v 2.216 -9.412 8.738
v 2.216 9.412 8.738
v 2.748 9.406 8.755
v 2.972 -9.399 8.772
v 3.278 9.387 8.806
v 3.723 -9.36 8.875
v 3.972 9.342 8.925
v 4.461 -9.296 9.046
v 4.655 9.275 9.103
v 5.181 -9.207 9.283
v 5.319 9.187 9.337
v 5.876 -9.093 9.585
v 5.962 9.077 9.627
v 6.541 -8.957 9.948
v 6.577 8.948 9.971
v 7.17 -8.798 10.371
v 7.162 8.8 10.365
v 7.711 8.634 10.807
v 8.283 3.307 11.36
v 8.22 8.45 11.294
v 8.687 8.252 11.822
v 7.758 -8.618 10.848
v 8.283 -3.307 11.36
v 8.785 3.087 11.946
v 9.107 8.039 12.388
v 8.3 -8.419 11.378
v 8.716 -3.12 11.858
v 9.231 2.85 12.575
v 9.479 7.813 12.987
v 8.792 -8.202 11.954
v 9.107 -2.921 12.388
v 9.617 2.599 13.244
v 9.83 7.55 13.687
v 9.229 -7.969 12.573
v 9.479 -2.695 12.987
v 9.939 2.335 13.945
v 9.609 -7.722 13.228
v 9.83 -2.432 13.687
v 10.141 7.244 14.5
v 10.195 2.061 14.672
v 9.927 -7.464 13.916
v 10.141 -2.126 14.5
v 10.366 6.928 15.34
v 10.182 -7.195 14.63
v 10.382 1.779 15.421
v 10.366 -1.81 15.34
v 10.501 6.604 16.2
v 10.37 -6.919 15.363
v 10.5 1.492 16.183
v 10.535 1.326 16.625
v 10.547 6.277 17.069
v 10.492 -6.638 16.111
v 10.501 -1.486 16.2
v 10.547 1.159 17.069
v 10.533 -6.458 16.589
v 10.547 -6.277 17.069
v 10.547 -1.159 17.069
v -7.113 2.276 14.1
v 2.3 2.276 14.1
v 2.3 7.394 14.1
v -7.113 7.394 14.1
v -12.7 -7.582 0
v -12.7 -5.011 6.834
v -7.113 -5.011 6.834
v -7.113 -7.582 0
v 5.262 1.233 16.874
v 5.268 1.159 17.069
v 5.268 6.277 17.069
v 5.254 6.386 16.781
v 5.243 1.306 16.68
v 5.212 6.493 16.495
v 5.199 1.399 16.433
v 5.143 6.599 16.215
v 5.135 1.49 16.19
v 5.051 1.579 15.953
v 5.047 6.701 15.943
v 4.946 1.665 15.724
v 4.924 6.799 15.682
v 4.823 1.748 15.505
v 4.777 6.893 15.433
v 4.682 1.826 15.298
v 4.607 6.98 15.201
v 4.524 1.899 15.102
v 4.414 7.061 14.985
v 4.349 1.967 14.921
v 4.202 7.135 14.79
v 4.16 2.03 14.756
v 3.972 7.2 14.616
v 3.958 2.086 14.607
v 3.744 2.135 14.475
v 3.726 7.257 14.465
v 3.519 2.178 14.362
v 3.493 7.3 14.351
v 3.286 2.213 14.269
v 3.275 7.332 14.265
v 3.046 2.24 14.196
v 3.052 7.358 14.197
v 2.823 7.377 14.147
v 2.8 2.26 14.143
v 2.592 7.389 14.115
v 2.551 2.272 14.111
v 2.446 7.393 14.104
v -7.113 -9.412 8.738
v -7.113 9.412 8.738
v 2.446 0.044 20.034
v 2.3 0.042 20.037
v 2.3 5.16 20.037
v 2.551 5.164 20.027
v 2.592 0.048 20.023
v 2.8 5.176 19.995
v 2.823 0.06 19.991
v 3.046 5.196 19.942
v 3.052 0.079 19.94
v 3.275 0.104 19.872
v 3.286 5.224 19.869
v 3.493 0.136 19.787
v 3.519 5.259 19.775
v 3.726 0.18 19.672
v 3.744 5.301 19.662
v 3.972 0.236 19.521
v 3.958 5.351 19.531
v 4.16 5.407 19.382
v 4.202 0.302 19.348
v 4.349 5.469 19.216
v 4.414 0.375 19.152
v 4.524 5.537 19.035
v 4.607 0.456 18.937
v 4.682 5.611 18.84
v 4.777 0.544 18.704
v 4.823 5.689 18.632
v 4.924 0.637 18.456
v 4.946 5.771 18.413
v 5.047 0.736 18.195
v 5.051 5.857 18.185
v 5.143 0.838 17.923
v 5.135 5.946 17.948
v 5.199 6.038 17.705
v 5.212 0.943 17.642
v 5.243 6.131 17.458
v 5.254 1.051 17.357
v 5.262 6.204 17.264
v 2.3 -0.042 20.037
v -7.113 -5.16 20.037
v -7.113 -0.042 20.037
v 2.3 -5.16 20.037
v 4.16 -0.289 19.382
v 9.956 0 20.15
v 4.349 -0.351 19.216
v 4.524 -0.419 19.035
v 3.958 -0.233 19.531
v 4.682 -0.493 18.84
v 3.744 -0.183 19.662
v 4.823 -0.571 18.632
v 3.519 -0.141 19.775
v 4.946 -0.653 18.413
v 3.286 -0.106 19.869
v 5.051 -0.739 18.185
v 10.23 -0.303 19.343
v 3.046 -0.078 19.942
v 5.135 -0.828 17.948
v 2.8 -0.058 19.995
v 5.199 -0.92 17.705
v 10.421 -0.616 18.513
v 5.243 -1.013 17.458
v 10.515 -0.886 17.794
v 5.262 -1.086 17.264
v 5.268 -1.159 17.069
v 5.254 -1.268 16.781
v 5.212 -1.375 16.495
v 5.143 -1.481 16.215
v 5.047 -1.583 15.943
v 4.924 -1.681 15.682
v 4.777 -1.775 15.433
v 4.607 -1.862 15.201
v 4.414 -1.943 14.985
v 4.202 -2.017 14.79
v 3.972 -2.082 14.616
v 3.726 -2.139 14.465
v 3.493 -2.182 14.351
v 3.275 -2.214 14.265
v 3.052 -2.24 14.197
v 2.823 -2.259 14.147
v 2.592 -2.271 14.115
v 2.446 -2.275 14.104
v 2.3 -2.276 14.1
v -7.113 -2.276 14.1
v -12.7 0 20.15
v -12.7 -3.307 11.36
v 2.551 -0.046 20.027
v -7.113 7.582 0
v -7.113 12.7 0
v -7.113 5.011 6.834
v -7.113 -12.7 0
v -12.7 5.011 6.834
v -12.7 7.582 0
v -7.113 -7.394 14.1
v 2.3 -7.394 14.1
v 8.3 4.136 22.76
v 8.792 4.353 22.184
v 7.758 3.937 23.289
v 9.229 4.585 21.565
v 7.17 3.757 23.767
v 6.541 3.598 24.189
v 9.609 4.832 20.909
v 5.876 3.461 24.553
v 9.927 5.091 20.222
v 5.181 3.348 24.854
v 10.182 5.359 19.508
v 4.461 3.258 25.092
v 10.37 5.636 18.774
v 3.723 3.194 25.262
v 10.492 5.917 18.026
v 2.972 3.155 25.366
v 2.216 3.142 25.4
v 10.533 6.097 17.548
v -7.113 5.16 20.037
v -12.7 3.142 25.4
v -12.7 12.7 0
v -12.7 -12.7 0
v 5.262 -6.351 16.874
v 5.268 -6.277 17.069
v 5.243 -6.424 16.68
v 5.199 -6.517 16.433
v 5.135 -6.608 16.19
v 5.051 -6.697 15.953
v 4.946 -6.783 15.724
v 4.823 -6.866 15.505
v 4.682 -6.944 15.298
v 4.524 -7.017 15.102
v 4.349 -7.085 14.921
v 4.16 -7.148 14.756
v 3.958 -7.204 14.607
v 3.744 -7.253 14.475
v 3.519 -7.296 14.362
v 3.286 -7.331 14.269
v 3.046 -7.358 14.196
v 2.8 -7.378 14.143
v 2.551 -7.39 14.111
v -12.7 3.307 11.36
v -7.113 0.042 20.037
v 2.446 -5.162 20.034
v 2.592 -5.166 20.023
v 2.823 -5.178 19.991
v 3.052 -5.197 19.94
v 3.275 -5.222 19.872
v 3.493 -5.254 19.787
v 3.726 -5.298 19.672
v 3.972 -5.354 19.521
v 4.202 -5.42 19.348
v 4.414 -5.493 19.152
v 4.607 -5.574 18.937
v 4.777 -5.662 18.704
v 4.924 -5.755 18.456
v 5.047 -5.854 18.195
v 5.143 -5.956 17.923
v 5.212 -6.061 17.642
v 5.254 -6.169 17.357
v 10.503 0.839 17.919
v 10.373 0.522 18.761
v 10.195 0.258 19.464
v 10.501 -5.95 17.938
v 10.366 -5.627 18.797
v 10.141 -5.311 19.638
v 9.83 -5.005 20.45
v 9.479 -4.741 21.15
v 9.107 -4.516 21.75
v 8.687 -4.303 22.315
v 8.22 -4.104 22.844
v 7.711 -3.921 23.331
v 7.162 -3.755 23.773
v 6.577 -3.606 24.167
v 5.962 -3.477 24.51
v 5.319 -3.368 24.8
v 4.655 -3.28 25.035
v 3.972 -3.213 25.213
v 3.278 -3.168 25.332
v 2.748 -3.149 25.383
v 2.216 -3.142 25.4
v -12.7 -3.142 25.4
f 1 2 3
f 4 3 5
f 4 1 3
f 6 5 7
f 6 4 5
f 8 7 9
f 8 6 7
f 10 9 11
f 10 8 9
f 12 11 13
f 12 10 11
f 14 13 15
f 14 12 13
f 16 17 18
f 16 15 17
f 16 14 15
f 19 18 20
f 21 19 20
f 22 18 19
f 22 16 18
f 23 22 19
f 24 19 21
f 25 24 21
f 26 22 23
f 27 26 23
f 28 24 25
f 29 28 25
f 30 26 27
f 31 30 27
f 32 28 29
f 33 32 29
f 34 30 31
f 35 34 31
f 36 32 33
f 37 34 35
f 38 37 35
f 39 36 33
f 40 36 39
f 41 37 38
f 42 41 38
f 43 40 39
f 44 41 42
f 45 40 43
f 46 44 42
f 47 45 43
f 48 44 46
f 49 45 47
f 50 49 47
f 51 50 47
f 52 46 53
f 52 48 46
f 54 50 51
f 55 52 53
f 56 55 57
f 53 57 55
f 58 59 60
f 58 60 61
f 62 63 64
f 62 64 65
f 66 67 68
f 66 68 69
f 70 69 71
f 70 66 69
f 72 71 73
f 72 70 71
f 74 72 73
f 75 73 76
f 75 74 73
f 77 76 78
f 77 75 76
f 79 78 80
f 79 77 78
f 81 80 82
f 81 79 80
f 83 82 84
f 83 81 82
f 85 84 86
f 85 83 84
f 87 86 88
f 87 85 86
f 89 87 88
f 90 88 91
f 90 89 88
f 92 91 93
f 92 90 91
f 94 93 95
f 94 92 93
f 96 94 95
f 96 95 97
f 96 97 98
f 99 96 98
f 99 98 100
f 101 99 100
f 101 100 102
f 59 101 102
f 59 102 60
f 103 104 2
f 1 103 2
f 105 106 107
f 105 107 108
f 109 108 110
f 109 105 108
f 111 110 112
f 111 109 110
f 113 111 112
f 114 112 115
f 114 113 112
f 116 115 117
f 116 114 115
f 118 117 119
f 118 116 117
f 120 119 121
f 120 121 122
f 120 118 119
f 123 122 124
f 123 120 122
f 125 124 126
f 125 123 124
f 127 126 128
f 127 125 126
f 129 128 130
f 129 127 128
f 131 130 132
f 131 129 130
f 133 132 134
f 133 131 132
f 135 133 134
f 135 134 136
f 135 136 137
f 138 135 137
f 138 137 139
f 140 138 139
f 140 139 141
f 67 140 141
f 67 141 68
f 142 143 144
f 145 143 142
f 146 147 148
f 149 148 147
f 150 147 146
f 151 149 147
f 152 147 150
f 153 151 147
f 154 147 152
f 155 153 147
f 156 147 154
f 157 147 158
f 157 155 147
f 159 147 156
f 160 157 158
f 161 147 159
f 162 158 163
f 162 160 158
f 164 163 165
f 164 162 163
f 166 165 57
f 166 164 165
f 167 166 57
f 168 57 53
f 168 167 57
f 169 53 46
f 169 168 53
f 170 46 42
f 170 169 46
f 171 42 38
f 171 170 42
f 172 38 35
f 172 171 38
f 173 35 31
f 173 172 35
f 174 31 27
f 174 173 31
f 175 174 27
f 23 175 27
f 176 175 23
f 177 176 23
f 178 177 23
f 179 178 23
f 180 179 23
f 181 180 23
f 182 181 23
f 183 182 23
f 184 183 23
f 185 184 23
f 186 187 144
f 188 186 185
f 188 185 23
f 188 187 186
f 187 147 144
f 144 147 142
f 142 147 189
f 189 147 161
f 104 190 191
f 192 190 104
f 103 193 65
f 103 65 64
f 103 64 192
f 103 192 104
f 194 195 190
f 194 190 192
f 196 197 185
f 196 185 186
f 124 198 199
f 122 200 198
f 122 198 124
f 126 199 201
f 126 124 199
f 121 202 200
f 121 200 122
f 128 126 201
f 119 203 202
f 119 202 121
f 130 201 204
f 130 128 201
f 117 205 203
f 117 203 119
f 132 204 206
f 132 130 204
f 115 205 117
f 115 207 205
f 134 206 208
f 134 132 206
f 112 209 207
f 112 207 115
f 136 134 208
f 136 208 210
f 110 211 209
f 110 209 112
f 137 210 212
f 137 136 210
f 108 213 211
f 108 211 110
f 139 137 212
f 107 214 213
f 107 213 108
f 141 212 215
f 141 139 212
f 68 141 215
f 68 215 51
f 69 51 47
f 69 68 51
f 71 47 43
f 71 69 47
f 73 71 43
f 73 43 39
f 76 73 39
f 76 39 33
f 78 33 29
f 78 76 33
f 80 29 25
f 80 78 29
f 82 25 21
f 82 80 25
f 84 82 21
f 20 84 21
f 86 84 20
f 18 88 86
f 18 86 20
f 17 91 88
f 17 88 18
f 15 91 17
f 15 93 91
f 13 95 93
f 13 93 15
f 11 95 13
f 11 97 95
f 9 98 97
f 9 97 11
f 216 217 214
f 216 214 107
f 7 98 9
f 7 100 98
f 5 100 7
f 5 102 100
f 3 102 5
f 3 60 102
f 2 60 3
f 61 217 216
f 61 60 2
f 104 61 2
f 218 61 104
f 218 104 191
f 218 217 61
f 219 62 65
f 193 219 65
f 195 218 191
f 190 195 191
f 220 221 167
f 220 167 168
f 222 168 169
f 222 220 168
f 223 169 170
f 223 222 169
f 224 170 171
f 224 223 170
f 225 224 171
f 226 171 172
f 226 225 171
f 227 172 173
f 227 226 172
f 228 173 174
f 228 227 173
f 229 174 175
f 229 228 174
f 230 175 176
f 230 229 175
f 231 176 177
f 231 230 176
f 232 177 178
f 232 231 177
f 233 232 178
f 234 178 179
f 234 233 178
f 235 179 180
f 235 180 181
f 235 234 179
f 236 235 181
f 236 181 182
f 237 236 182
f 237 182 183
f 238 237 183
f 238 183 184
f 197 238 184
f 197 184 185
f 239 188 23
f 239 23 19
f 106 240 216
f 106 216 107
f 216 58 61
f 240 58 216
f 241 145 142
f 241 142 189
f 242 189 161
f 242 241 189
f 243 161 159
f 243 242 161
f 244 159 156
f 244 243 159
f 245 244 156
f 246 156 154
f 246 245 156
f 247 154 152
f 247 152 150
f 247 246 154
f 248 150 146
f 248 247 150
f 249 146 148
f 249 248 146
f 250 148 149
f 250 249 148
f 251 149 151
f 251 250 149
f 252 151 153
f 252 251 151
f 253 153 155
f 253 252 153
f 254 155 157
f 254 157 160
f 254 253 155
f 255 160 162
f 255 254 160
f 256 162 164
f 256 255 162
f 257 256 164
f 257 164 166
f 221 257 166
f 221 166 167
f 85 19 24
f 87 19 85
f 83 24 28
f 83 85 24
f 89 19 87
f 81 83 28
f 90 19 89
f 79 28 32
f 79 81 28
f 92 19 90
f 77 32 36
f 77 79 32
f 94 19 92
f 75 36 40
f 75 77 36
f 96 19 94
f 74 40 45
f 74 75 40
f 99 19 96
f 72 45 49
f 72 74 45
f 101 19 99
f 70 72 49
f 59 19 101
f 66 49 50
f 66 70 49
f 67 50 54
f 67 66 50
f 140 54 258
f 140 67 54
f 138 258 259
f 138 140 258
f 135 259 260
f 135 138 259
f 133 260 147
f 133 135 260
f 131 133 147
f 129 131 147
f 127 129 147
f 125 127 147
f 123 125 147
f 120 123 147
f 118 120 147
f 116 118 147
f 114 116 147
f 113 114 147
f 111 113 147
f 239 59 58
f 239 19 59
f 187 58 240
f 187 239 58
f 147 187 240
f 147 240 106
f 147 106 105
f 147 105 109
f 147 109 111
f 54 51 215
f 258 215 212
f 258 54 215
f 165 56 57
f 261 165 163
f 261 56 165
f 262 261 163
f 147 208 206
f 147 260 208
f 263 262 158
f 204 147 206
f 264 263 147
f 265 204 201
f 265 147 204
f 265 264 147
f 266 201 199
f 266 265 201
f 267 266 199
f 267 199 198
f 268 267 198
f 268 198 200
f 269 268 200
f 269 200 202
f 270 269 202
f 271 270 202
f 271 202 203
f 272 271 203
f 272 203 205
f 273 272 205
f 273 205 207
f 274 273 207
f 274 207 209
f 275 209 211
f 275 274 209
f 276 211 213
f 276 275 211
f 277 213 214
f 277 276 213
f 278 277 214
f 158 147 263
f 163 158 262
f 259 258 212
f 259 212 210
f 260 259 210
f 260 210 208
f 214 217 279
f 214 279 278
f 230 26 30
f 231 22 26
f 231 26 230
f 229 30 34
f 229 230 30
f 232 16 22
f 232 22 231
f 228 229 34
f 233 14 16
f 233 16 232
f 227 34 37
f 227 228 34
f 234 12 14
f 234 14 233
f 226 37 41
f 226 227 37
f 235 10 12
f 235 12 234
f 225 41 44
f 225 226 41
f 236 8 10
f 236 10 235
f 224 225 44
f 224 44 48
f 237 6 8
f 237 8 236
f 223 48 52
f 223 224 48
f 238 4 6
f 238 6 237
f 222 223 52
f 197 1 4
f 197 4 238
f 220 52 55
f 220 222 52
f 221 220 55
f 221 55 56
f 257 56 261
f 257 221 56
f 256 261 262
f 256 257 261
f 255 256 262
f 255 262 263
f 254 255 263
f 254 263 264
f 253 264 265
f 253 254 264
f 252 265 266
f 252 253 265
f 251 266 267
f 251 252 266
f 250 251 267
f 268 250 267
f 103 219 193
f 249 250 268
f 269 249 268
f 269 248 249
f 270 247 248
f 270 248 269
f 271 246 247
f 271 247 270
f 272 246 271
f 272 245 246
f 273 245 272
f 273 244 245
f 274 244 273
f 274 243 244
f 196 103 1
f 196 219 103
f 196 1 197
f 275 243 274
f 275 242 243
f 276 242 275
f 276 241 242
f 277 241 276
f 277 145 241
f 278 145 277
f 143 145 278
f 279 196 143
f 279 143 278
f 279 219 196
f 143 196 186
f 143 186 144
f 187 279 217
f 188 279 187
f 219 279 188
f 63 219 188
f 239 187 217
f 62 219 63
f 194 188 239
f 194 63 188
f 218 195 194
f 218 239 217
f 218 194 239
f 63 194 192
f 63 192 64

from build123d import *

# Parameters (mm, degrees)
F0_W     = 25.4
F0_H     = 25.4
F1_DEPTH = 25.4
F5_DEPTH = 25.401
F6_DEPTH = 25.401


with BuildPart() as f1:
    # F0 (on Top) → F1 (new body)
    with BuildSketch(Plane.XY):
        Rectangle(F0_W, F0_H)
    extrude(amount=F1_DEPTH)

    # F3 (on face) → F5 (intersect, through all)
    with BuildSketch(Plane(origin=(-12.7, 0, 0), x_dir=(0, -1, 0), z_dir=(-1, 0, 0))):
        Polygon((3.142383, 25.4), (0, 25.4), (-3.142383, 25.4), (-12.7, 0), (-7.581967, 0), (-5.010512, 6.833812), (0, 6.833812), (5.010512, 6.833812), (7.581967, 0), (12.7, 0), align=None)
        Polygon((-3.307431, 11.359861), (0, 20.149579), (3.307431, 11.359861), (0, 11.359861), align=None, mode=Mode.SUBTRACT)
    extrude(amount=-F5_DEPTH, mode=Mode.INTERSECT)

    # F4 (on face) → F6 (intersect, through all)
    with BuildSketch(Plane.XZ.offset(12.7)):
        with BuildLine():
            Line((-7.112893, 25.4), (-12.7, 25.4))
            Line((-12.7, 25.4), (-12.7, 0))
            Line((-12.7, 0), (-7.112893, 0))
            Line((-7.112893, 0), (-7.112893, 8.737554))
            Line((-7.112893, 8.737554), (2.215559, 8.737554))
            ThreePointArc((2.215559, 8.737554), (-2.51092, 10.208043), (-5.56892, 14.100417))
            Line((-5.56892, 14.100417), (-7.112893, 14.100417))
            Line((-7.112893, 14.100417), (-7.112893, 20.037137))
            Line((-7.112893, 20.037137), (-5.56892, 20.037137))
            ThreePointArc((-5.56892, 20.037137), (-2.51092, 23.929511), (2.215559, 25.4))
            Line((2.215559, 25.4), (-7.112893, 25.4))
        make_face()
        with BuildLine():
            ThreePointArc((10.546782, 17.068777), (8.106623, 22.959841), (2.215559, 25.4))
            ThreePointArc((2.215559, 25.4), (-2.51092, 23.929511), (-5.56892, 20.037137))
            Line((-5.56892, 20.037137), (2.299962, 20.037137))
            ThreePointArc((2.299962, 20.037137), (4.398909, 19.167725), (5.268321, 17.068777))
            ThreePointArc((5.268321, 17.068777), (4.398909, 14.96983), (2.299962, 14.100417))
            Line((2.299962, 14.100417), (-5.56892, 14.100417))
            ThreePointArc((-5.56892, 14.100417), (-2.51092, 10.208043), (2.215559, 8.737554))
            ThreePointArc((2.215559, 8.737554), (8.106623, 11.177713), (10.546782, 17.068777))
        make_face()
    extrude(amount=-F6_DEPTH, mode=Mode.INTERSECT)


solid = f1.part
